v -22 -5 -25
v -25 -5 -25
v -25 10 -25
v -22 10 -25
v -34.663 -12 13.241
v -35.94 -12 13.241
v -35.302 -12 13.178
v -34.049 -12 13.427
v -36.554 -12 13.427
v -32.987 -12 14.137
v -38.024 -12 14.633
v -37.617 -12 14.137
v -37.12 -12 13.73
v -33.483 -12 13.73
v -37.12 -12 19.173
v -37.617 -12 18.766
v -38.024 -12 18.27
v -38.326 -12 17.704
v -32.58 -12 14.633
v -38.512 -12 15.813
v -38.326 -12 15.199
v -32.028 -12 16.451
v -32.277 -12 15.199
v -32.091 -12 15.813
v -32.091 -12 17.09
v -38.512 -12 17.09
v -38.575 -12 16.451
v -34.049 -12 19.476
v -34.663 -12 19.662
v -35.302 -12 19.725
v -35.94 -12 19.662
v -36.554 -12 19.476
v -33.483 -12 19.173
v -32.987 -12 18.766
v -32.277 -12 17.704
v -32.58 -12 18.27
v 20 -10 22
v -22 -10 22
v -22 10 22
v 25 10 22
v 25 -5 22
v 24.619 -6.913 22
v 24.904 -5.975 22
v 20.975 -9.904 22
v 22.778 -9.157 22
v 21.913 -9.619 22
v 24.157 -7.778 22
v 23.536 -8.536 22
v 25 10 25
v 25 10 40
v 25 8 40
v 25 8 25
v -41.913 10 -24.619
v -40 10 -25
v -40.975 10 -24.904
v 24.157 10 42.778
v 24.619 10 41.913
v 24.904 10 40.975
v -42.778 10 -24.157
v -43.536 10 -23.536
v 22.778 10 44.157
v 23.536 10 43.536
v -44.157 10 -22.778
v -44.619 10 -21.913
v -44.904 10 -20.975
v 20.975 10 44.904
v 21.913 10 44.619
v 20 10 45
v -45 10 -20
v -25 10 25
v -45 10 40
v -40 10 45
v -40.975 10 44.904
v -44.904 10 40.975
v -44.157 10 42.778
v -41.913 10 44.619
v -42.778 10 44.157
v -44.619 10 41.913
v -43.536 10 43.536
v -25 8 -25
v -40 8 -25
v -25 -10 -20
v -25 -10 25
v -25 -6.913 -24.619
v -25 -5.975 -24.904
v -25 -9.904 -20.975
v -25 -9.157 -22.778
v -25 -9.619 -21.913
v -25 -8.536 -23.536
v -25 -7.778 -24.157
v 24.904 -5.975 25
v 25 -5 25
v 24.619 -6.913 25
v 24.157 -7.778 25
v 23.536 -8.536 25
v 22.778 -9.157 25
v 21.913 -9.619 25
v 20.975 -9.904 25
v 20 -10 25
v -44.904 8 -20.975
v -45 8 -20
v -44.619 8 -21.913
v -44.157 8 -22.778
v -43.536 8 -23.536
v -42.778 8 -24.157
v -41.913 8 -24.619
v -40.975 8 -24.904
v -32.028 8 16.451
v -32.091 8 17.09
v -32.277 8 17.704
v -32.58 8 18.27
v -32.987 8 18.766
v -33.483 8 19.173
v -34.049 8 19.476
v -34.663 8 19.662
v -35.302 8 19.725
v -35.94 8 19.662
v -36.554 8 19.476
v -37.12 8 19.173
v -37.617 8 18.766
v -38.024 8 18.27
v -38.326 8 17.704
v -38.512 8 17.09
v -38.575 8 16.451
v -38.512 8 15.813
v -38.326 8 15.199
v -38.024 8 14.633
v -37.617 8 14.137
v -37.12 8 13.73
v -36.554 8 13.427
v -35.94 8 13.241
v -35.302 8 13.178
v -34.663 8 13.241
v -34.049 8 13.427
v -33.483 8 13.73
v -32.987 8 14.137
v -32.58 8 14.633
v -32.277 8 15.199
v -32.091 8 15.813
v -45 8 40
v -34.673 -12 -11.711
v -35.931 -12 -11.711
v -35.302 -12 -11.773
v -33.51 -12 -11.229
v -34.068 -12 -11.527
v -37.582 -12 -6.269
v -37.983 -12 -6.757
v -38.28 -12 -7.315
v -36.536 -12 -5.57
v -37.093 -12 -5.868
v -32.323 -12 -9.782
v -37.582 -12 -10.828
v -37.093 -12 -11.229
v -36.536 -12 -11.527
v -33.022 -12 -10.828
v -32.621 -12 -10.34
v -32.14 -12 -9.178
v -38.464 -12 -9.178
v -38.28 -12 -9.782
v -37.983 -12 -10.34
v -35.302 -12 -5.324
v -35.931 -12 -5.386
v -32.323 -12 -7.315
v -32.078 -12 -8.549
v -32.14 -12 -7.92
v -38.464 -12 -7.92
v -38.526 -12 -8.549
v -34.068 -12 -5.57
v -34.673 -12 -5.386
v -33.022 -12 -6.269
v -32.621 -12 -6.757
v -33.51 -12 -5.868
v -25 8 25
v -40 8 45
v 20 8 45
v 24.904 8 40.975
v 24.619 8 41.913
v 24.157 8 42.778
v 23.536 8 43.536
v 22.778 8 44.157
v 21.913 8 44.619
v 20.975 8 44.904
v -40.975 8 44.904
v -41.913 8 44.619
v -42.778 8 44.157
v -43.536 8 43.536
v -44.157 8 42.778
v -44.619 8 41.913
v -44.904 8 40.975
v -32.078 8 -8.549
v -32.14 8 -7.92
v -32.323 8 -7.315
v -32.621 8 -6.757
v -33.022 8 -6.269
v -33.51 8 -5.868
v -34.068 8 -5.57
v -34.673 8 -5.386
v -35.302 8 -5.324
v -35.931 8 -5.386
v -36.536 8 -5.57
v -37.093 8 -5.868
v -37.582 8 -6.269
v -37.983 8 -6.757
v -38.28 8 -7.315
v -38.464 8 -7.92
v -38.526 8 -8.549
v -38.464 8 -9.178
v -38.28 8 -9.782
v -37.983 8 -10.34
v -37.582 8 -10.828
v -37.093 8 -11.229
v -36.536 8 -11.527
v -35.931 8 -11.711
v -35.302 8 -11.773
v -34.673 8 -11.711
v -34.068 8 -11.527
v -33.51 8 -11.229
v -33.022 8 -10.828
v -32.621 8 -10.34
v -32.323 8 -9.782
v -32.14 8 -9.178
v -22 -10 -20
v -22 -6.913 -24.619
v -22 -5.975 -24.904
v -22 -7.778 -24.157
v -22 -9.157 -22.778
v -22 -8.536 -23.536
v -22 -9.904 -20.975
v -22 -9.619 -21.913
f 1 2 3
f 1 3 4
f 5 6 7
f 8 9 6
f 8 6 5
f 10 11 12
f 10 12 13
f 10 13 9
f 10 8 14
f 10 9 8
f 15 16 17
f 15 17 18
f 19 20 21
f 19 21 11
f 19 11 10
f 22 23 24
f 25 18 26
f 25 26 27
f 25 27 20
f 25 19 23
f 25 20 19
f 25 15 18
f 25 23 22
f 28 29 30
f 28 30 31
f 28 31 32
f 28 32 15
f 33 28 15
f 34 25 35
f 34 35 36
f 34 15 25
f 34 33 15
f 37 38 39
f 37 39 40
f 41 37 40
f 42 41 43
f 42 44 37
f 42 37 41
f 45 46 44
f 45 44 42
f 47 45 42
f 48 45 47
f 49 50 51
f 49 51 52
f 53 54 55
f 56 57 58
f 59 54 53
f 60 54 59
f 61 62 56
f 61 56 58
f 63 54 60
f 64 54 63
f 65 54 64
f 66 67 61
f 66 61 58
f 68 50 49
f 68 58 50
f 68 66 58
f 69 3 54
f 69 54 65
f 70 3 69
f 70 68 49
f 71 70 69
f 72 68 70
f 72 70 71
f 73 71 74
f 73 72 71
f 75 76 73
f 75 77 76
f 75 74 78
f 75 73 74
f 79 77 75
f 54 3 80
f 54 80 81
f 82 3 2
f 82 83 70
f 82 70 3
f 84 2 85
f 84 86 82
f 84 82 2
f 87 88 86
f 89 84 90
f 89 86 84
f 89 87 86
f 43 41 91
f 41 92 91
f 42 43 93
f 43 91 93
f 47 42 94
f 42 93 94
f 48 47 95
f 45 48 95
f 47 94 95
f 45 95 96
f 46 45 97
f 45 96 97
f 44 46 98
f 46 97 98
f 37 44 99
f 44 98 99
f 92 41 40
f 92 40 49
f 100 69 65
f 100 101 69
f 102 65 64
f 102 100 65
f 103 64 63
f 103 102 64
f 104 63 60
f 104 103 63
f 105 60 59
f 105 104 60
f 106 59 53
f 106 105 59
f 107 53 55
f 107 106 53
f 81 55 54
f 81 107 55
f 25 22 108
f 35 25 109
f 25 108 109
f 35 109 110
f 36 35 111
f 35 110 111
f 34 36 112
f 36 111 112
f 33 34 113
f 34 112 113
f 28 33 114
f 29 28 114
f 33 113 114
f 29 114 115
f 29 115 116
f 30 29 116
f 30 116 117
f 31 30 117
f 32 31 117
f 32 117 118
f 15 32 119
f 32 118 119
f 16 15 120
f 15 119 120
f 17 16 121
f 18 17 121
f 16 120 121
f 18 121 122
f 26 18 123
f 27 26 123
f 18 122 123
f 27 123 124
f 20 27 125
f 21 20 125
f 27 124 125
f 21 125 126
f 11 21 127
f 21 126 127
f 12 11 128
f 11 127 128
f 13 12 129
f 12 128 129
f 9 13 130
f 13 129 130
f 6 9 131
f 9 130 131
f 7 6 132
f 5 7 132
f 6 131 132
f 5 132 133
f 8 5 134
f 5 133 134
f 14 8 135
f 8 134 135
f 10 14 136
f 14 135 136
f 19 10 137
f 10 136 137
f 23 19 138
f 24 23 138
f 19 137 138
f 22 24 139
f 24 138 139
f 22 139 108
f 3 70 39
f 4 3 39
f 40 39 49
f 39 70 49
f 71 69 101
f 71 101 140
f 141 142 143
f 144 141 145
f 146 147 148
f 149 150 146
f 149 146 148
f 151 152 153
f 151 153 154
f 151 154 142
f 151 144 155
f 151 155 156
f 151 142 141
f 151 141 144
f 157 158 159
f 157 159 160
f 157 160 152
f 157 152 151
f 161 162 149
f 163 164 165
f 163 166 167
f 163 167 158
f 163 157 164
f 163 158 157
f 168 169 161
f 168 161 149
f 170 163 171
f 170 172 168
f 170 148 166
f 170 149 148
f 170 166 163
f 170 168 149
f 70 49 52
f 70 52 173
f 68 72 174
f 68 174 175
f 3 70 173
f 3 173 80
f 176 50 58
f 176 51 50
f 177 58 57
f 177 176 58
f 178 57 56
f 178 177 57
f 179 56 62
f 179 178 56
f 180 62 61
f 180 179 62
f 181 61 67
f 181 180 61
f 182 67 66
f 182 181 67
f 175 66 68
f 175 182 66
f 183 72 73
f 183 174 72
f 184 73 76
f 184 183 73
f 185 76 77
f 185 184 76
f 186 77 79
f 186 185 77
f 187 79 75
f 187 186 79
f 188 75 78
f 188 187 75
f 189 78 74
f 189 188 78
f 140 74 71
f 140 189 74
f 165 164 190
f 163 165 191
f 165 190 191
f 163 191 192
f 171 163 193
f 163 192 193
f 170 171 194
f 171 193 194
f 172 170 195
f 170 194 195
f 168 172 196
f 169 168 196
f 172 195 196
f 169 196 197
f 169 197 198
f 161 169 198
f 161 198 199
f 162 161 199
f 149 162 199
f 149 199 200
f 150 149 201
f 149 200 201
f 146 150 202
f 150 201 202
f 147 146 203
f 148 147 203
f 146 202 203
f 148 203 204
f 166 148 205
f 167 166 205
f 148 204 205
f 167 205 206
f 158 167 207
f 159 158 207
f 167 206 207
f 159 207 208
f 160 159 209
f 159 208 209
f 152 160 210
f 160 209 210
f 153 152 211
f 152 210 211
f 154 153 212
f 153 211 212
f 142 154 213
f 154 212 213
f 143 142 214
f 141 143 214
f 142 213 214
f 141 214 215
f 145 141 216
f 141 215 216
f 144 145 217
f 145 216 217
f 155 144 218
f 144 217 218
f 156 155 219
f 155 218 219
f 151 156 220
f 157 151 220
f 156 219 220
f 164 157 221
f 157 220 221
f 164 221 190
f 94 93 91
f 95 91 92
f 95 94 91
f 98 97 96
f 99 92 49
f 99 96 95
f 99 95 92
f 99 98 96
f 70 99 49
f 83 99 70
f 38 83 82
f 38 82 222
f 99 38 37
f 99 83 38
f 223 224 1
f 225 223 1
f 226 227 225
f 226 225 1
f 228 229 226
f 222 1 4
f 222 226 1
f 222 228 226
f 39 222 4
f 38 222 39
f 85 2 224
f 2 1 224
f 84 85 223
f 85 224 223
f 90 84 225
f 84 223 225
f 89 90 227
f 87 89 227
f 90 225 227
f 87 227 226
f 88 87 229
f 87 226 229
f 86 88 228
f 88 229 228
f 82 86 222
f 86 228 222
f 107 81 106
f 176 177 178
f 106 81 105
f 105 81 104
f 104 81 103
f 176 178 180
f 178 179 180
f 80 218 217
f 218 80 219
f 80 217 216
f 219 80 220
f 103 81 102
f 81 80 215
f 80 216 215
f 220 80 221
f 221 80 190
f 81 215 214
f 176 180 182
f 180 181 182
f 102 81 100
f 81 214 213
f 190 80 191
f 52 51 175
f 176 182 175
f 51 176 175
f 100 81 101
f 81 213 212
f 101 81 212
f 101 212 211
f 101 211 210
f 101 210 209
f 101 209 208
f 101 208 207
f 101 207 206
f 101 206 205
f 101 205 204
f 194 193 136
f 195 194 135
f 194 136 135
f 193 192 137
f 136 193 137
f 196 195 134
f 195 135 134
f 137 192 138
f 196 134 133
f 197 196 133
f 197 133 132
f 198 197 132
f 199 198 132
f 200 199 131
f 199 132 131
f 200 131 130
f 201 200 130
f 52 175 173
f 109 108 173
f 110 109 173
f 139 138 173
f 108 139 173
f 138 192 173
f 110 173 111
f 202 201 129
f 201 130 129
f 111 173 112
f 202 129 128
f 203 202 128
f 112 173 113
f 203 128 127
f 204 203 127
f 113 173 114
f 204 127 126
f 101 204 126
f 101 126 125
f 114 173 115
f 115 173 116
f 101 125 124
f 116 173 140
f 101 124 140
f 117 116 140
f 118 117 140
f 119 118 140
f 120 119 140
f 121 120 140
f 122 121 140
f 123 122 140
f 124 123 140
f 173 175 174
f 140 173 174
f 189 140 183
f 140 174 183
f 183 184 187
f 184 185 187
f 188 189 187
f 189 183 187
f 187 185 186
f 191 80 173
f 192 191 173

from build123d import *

# Parameters (mm, degrees)
F1_DEPTH = 10
F3_DEPTH = 2
F4_R     = 3.2736436262
F4_R_2   = 3.2241635896
F5_DEPTH = 20
F6_R     = 5
F6_2_R   = 5


# Not quite as in the source:
# - the program builds the solid bodies; features that only make, move or delete a surface that nothing else refers to are left out


with BuildPart() as f1:
    # F0 (on Front) → F1 (new body, symmetric)
    with BuildSketch(Plane.XZ):
        Polygon((25, 22), (25, 25), (-25, 25), (-25, -25), (-22, -25), (-22, -22), (-22, 22), (22, 22), align=None)
    extrude(amount=F1_DEPTH, both=True)

    # F6
    f6_edges = [f1.edges().sort_by_distance(p)[0] for p in [
        (25, -10, 23.5),
        (-23.5, -10, -25),
    ]]
    fillet(f6_edges, radius=F6_R)


with BuildPart() as f3:
    # F2 (on face) → F3 (new body)
    with BuildSketch(Plane(origin=(0, 10, 0), x_dir=(-1, 0, 0), z_dir=(0, 1, 0))):
        Polygon((-25, 45), (-25, 25), (25, 25), (25, -25), (45, -25), (45, 45), align=None)
    extrude(amount=-F3_DEPTH)

    # F4 (on face) → F5 (join)
    with BuildSketch(Plane.XZ.offset(-8)):
        with Locations((-35.3017263114, 16.4514879785)):
            Circle(F4_R)
        with Locations((-35.3017263114, -8.5485120215)):
            Circle(F4_R_2)
    extrude(amount=F5_DEPTH)

    # F6#2
    f6_2_edges = [f3.edges().sort_by_distance(p)[0] for p in [
        (25, 9, 45),
        (-45, 9, -25),
        (-45, 9, 45),
    ]]
    fillet(f6_2_edges, radius=F6_2_R)


solid = Compound([f1.part, f3.part])
